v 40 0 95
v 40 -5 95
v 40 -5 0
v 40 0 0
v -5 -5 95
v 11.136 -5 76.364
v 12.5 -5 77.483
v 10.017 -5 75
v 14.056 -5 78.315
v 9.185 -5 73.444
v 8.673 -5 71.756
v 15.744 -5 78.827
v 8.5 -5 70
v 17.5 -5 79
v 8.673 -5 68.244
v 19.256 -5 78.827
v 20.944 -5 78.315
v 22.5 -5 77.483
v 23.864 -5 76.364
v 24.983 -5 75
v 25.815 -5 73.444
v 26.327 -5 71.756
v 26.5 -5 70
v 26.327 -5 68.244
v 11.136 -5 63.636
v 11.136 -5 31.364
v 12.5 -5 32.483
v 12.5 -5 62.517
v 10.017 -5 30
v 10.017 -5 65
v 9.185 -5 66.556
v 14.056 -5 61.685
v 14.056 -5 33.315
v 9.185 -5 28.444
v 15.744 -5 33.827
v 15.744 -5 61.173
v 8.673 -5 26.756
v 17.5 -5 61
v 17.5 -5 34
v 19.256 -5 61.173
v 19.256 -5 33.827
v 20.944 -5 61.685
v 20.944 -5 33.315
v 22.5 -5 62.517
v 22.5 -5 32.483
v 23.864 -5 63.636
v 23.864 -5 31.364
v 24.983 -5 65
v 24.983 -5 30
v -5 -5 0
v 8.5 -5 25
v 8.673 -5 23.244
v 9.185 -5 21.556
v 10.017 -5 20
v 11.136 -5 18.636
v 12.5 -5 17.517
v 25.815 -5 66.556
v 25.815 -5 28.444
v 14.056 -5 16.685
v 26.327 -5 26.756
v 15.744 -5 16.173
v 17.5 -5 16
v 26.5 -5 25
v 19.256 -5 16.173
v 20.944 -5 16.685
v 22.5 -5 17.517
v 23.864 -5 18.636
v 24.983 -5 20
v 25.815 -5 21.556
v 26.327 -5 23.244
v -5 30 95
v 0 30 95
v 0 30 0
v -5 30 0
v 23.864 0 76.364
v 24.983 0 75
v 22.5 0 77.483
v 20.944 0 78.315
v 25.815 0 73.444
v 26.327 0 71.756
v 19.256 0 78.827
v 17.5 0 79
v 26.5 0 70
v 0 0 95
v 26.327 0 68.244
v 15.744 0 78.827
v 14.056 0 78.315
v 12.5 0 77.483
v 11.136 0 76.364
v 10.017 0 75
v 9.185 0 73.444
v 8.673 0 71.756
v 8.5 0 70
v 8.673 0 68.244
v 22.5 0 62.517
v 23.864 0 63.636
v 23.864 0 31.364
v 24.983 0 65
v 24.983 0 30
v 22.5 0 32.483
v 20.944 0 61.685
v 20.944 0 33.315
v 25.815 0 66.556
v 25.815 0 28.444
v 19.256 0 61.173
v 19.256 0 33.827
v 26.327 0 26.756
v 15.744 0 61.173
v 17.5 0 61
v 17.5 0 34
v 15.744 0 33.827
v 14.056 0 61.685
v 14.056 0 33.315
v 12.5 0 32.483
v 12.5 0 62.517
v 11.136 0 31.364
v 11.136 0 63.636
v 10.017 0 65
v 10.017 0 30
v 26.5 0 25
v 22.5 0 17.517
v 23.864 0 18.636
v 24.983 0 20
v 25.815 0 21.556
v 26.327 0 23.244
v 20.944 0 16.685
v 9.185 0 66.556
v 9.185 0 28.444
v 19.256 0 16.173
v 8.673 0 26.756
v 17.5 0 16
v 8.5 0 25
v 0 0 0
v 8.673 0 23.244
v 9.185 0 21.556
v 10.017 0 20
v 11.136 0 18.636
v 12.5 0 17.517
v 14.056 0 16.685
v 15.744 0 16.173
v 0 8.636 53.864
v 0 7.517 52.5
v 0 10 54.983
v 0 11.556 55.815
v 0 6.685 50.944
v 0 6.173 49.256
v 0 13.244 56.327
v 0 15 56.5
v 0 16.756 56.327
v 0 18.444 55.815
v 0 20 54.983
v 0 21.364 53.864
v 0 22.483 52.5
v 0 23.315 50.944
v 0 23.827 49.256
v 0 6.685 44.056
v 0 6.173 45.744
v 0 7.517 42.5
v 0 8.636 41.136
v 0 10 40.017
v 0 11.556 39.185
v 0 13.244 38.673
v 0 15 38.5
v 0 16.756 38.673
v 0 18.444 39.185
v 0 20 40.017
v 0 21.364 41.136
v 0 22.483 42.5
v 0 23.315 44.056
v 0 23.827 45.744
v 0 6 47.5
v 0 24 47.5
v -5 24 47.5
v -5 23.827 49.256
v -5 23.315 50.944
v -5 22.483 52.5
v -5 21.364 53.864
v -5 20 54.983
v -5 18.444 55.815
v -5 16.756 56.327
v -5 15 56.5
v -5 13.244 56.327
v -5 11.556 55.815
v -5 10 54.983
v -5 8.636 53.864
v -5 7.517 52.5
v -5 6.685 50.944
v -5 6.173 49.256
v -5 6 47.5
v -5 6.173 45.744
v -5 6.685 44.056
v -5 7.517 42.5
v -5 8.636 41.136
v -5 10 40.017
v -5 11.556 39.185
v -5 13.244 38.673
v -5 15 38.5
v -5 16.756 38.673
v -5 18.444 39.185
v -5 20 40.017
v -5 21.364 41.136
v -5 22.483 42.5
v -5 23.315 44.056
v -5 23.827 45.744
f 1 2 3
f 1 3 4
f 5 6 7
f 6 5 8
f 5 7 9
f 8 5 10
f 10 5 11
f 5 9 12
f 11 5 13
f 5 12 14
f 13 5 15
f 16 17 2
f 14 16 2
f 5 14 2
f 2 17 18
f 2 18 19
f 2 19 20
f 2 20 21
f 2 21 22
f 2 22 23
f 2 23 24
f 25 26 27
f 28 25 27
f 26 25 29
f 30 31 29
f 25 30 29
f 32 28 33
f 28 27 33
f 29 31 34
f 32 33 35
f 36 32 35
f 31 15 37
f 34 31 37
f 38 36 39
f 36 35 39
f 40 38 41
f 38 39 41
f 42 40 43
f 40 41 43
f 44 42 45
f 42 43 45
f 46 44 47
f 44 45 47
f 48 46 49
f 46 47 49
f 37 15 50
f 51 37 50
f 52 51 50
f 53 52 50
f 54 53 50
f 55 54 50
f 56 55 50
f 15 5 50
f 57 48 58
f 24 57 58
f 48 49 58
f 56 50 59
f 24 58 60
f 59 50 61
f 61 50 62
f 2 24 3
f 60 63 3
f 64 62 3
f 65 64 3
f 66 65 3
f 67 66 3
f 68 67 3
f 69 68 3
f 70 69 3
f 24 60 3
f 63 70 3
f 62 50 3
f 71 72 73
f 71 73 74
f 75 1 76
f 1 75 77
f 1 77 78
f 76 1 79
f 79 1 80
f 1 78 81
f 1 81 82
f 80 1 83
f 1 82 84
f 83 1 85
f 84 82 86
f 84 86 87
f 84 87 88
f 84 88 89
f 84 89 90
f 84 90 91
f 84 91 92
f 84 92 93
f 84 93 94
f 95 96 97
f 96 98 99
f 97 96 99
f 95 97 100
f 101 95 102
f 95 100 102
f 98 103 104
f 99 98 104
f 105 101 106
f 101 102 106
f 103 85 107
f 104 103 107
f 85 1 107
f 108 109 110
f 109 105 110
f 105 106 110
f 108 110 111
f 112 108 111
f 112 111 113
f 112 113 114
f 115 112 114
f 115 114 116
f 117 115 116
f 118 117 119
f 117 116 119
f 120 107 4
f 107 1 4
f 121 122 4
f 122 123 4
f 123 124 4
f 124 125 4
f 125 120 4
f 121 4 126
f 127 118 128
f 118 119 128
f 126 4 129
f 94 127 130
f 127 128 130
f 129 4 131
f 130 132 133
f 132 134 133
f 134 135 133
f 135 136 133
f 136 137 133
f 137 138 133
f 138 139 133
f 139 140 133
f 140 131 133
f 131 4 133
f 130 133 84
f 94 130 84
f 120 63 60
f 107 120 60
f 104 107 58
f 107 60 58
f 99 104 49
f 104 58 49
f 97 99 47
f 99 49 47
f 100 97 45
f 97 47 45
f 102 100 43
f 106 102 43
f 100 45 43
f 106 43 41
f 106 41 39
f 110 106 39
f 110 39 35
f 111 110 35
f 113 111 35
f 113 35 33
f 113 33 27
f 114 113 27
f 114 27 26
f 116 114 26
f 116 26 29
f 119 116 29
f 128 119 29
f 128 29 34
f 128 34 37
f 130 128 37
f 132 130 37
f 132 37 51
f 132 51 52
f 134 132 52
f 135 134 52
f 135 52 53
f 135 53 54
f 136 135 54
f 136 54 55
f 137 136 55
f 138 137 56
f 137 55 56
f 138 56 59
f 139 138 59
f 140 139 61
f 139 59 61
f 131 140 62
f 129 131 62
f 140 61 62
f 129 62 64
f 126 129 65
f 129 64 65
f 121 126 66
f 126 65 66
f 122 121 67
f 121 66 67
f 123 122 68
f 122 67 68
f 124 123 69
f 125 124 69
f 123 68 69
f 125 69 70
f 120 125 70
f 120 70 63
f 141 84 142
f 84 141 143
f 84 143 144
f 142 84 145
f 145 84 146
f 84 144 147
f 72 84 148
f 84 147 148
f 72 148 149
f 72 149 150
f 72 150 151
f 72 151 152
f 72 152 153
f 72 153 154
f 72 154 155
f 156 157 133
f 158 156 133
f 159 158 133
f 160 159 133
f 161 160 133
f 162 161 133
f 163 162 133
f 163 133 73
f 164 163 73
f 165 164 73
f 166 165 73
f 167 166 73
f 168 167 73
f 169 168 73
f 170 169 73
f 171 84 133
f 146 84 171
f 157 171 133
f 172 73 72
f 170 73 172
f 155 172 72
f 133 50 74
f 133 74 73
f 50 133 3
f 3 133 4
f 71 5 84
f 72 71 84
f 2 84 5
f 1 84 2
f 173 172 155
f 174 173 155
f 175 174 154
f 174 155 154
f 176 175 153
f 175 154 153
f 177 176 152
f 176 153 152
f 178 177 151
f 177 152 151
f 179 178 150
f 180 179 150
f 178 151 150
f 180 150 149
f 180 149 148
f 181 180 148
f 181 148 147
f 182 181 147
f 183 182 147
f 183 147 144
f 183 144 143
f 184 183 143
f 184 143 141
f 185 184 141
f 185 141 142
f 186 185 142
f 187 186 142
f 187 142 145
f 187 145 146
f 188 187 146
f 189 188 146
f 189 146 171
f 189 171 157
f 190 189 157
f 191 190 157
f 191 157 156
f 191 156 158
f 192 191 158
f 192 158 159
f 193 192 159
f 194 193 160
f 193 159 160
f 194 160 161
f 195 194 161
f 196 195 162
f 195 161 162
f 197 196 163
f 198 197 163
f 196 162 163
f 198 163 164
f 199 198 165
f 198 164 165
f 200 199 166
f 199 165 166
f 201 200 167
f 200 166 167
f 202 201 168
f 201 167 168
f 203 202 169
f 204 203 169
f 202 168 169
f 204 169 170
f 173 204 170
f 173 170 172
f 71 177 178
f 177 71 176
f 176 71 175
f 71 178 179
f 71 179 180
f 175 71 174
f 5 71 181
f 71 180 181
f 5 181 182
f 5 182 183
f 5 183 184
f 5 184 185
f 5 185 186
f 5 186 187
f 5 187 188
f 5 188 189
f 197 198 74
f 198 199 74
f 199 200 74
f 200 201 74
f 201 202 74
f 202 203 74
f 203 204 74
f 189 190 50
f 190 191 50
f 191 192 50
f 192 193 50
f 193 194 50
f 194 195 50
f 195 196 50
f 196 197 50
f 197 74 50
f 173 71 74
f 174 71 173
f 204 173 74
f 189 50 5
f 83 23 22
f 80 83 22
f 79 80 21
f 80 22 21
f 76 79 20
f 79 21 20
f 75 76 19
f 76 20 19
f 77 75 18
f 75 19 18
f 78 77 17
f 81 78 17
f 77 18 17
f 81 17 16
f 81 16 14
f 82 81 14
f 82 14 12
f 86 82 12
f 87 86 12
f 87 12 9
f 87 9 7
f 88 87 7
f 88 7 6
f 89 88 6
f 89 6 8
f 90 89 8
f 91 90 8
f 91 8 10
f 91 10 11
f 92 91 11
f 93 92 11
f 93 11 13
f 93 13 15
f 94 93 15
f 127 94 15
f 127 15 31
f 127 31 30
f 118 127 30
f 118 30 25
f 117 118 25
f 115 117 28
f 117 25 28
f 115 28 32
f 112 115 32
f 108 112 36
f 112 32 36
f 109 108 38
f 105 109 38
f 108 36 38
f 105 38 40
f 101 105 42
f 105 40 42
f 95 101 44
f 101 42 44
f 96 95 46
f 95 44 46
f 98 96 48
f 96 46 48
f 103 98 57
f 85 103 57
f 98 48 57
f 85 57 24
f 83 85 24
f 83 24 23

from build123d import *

# Parameters (mm, degrees)
F1_DEPTH = 95
F2_R     = 9
F3_DEPTH = 25
F4_R     = 9
F5_DEPTH = 25


with BuildPart() as f1:
    # F0 (on Top) → F1 (new body)
    with BuildSketch(Plane.XY):
        Polygon((0, 0), (0, 30), (-5, 30), (-5, -5), (40, -5), (40, 0), align=None)
    extrude(amount=F1_DEPTH)

    # F2 (on face) → F3 (cut)
    with BuildSketch(Plane.XZ.offset(5)):
        with Locations((17.5, 70)):
            Circle(F2_R)
        with Locations((17.5, 25)):
            Circle(F2_R)
    extrude(amount=-F3_DEPTH, mode=Mode.SUBTRACT)

    # F4 (on face) → F5 (cut)
    with BuildSketch(Plane.YZ):
        with Locations((15, 47.5)):
            Circle(F4_R)
    extrude(amount=-F5_DEPTH, mode=Mode.SUBTRACT)


solid = f1.part
